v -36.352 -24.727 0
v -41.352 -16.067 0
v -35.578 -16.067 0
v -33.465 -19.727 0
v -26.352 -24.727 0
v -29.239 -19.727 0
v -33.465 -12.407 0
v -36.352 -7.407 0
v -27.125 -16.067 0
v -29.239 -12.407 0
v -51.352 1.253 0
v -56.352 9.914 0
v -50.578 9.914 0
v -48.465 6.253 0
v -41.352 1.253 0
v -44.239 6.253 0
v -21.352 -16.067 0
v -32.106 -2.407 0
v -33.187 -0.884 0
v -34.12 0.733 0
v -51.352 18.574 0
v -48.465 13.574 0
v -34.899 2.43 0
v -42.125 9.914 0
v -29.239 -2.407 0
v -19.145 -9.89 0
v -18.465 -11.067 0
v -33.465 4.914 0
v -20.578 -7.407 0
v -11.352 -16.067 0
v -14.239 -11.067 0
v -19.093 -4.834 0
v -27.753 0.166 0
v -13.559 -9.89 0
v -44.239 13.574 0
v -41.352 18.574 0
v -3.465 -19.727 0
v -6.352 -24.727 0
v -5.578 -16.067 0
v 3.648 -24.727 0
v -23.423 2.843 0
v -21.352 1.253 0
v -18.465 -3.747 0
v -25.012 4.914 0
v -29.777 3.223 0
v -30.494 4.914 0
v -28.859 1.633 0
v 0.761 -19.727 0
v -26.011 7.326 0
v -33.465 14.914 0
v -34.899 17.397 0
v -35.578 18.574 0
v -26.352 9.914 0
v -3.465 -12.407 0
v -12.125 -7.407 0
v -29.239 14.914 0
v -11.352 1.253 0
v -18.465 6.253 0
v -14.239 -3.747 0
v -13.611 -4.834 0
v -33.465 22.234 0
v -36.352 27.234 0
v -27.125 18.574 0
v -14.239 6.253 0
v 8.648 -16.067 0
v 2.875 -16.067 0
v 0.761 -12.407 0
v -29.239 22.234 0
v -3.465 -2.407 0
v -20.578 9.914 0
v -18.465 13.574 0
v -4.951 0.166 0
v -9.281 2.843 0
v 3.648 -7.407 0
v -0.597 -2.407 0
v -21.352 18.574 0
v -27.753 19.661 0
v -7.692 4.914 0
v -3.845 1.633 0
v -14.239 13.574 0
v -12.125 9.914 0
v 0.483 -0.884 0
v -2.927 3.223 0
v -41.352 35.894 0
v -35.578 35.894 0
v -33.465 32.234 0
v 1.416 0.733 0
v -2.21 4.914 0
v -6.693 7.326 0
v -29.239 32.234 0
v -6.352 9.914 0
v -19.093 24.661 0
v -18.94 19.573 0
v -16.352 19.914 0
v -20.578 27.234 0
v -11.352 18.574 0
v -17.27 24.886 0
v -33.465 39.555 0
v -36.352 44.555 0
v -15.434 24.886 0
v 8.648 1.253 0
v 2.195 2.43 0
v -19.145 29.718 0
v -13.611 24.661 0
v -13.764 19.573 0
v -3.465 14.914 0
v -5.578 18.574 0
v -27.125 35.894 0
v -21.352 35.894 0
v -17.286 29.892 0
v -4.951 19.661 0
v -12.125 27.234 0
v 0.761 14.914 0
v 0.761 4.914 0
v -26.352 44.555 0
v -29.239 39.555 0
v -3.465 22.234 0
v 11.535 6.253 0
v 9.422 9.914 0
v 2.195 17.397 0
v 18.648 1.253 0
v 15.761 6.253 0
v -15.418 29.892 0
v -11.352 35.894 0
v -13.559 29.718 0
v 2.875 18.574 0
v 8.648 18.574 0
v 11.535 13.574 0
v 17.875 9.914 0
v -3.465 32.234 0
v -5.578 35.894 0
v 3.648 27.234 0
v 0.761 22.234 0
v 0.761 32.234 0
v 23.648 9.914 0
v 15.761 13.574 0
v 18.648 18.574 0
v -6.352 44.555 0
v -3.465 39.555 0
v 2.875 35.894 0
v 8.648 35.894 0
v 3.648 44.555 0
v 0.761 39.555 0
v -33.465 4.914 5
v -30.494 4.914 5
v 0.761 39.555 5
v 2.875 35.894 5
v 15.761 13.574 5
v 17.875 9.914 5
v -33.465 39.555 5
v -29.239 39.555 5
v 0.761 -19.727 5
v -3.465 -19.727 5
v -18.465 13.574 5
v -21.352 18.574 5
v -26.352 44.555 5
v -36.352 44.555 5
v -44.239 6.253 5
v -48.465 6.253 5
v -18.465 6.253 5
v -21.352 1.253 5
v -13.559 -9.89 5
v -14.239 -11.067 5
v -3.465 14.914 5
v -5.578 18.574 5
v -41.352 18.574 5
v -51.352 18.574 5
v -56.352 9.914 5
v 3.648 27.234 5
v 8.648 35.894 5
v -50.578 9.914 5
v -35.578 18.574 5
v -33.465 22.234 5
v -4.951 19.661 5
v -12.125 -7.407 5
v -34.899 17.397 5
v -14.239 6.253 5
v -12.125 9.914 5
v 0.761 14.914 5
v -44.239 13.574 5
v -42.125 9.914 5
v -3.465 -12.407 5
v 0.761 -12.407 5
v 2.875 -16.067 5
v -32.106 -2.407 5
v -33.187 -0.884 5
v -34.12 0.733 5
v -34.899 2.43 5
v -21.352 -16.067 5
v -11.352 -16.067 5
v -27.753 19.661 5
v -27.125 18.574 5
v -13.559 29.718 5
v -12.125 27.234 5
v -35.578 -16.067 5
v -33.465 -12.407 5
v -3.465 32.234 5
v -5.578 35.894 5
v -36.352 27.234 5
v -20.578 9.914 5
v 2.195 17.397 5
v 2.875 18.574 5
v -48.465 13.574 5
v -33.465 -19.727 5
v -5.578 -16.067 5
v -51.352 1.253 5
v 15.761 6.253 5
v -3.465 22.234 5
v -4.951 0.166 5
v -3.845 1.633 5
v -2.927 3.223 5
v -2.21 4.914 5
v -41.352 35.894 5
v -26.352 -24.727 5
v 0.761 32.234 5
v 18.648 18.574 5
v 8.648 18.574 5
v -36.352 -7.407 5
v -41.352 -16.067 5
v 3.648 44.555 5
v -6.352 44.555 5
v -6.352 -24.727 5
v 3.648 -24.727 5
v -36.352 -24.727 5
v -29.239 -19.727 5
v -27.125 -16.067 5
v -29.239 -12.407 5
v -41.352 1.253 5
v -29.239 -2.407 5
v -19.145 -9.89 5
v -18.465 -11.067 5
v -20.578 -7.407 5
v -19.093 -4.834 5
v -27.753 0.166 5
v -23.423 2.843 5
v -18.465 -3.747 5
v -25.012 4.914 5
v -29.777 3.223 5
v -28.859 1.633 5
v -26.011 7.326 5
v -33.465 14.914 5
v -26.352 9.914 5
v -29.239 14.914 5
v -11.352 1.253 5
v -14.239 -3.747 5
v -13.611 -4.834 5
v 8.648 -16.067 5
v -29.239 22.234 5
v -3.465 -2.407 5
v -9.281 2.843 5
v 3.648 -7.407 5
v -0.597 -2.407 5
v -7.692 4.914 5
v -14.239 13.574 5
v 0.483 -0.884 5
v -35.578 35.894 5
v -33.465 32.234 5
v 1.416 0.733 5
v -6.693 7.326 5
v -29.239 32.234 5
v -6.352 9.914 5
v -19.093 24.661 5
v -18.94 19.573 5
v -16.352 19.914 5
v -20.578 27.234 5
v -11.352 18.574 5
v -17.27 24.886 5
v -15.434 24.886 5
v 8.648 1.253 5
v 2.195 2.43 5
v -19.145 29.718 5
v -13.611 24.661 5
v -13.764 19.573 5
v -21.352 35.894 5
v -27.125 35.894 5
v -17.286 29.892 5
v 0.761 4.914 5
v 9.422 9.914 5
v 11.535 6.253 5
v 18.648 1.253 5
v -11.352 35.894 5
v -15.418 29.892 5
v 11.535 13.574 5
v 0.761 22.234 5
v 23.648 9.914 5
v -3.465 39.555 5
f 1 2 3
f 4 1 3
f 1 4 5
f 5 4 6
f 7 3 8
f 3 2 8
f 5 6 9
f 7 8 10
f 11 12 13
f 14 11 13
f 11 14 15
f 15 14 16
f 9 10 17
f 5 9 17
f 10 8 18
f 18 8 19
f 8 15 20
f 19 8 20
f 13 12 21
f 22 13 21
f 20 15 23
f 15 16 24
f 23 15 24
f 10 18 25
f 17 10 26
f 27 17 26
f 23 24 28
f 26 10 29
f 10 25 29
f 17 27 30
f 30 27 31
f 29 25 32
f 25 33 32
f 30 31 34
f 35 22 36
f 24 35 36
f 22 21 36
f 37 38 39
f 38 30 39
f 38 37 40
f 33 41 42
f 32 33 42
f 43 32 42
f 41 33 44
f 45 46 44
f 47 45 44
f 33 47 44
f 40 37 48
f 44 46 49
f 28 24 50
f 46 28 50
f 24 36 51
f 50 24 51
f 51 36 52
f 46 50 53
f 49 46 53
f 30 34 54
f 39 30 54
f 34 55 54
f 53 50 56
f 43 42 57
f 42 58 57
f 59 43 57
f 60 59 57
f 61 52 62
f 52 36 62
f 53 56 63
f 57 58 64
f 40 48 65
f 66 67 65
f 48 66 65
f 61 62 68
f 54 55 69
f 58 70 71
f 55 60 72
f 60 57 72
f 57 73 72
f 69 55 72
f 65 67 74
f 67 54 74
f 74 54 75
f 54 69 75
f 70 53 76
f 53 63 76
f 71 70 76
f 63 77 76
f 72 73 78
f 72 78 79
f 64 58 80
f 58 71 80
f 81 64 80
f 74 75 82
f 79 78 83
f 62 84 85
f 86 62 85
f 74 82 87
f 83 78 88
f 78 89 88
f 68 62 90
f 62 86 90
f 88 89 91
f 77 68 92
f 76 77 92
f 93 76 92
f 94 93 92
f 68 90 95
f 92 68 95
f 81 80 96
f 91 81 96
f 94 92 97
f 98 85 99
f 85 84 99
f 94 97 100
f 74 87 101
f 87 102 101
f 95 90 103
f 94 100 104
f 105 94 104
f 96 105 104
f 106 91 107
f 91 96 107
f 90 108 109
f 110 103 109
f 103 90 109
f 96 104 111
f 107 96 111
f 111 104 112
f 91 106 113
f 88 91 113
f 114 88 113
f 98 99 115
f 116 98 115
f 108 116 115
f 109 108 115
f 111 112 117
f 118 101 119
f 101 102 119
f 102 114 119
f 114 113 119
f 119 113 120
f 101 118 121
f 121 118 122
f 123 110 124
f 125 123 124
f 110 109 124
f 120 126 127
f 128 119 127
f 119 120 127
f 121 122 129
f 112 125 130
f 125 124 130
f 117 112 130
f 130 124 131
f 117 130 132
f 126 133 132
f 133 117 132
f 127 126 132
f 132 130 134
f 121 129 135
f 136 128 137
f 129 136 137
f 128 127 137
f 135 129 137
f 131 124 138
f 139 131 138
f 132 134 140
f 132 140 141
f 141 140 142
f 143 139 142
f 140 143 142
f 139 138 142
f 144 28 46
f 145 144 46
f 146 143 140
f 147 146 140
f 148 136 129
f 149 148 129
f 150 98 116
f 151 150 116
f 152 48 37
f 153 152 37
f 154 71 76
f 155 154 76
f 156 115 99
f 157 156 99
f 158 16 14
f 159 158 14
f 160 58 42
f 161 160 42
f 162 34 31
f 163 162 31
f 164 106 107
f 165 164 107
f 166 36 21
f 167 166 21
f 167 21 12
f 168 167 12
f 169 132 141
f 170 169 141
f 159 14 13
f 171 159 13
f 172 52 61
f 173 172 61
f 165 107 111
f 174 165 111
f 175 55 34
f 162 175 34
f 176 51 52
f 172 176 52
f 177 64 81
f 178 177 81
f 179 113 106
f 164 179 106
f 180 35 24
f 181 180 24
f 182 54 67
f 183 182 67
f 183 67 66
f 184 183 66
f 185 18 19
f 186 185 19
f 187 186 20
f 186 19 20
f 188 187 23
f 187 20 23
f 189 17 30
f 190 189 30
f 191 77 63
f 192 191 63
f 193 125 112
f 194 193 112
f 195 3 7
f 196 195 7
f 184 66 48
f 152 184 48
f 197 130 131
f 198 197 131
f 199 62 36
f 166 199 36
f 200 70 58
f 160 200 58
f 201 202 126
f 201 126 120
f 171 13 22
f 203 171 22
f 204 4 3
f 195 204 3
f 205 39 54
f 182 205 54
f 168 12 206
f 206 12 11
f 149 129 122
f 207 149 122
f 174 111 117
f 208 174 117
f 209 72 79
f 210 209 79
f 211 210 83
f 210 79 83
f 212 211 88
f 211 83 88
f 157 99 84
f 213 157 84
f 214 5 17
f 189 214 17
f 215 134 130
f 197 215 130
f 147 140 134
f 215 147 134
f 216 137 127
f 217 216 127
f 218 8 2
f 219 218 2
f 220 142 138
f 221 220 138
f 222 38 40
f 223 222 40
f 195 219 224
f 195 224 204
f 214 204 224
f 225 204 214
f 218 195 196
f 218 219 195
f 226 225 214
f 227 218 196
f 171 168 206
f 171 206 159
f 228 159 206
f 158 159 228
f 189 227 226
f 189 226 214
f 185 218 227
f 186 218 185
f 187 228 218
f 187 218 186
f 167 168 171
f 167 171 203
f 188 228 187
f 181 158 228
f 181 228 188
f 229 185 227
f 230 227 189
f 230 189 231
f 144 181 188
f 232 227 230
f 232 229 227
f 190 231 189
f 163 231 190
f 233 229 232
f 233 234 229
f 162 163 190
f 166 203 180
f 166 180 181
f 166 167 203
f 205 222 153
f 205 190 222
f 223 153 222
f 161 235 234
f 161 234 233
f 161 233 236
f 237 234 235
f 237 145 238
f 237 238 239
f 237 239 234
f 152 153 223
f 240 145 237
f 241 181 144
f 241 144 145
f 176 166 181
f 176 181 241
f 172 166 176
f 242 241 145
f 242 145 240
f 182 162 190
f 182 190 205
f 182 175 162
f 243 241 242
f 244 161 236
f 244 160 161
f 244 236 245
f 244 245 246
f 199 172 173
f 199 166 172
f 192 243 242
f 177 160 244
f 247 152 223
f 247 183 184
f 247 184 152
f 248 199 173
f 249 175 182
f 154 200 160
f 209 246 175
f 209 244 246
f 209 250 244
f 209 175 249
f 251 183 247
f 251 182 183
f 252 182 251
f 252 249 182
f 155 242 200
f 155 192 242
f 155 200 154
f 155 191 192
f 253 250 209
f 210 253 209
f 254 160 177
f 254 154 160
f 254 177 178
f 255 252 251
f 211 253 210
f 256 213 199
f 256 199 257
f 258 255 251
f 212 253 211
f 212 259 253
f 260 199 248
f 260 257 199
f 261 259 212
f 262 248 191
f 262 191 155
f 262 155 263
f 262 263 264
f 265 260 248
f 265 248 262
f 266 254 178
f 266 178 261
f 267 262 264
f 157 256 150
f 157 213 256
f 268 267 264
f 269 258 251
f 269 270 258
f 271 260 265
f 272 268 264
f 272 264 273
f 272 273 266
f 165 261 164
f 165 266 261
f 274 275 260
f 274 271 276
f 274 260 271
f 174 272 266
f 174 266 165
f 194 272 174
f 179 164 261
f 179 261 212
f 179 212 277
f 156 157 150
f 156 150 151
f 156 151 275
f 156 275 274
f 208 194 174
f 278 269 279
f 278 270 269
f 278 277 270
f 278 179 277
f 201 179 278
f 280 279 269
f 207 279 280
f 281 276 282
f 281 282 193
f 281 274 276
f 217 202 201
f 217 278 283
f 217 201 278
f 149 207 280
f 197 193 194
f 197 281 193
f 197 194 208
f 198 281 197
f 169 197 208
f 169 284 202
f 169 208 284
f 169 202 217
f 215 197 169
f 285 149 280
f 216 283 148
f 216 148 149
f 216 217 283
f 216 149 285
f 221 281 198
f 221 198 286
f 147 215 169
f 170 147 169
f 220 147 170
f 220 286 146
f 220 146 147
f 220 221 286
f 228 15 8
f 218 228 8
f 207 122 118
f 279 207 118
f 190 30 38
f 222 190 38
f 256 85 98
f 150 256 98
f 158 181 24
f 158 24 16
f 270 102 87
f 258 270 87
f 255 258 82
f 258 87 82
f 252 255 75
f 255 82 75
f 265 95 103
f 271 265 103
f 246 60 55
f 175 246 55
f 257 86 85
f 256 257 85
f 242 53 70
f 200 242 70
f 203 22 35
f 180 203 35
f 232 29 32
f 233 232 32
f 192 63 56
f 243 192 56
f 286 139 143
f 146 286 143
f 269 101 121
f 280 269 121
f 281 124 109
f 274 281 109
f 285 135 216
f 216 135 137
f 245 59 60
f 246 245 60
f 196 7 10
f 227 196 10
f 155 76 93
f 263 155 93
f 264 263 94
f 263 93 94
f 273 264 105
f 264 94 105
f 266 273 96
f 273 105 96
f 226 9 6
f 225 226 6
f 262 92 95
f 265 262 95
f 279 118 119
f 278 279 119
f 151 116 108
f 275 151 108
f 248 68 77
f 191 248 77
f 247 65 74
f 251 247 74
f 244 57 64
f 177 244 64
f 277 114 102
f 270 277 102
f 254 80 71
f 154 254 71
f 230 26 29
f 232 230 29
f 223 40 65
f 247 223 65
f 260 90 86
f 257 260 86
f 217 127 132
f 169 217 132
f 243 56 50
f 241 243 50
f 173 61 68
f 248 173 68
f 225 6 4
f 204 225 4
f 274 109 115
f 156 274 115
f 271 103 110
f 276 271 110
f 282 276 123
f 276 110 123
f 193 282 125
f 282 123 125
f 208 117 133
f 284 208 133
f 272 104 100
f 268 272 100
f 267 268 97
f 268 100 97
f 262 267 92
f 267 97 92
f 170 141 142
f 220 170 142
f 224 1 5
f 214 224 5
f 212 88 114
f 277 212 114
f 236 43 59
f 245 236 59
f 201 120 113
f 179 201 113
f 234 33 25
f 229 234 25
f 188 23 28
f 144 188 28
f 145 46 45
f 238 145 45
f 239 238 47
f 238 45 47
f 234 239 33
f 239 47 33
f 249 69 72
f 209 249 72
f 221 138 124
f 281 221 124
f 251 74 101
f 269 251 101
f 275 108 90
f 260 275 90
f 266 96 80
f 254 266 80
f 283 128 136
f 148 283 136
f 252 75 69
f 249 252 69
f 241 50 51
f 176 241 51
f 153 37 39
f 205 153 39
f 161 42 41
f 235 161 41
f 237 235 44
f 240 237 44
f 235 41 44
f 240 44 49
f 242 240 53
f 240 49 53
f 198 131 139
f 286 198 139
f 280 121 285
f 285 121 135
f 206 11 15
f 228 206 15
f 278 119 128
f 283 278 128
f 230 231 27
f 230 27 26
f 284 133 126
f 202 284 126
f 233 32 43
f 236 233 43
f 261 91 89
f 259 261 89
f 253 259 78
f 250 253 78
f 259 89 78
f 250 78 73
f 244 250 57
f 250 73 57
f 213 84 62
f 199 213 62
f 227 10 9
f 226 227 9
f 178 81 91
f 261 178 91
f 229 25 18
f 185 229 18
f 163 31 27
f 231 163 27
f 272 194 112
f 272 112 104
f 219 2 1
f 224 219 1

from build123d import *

# Parameters (mm, degrees)
F1_DEPTH = 5


with BuildPart() as f1:
    # F0 (on Top) → F1 (new body)
    with BuildSketch(Plane.XY):
        with BuildLine():
            Line((-11.351928, -16.06705), (-6.351928, -7.406796))
            ThreePointArc((-6.351928, -7.406796), (-9.836197, -8.995155), (-13.559318, -9.890362))
            Line((-13.559318, -9.890362), (-14.238679, -11.06705))
            Line((-14.238679, -11.06705), (-18.465176, -11.06705))
            Line((-18.465176, -11.06705), (-19.144538, -9.890362))
            ThreePointArc((-19.144538, -9.890362), (-22.867658, -8.995155), (-26.351928, -7.406796))
            Line((-26.351928, -7.406796), (-21.351928, -16.06705))
            Line((-21.351928, -16.06705), (-11.351928, -16.06705))
        make_face()
        Polygon((-21.351928, 18.573966), (-26.351928, 9.913712), (-20.578425, 9.913712), (-18.465176, 13.573966), align=None)
        with BuildLine():
            Line((-41.351928, 18.573966), (-36.351928, 9.913712))
            ThreePointArc((-36.351928, 9.913712), (-35.985352, 13.725357), (-34.899064, 17.397277))
            Line((-34.899064, 17.397277), (-35.578425, 18.573966))
            Line((-35.578425, 18.573966), (-33.465176, 22.23422))
            Line((-33.465176, 22.23422), (-32.106454, 22.23422))
            ThreePointArc((-32.106454, 22.23422), (-29.469622, 25.010934), (-26.351928, 27.23422))
            Line((-26.351928, 27.23422), (-36.351928, 27.23422))
            Line((-36.351928, 27.23422), (-41.351928, 18.573966))
        make_face()
        Polygon((-36.351928, 27.23422), (-26.351928, 27.23422), (-21.351928, 35.894474), (-26.351928, 44.554728), (-36.351928, 44.554728), (-41.351928, 35.894474), align=None)
        Polygon((-33.465176, 39.554728), (-29.238679, 39.554728), (-27.12543, 35.894474), (-29.238679, 32.23422), (-33.465176, 32.23422), (-35.578425, 35.894474), align=None, mode=Mode.SUBTRACT)
        Polygon((-41.351928, 1.253458), (-36.351928, 9.913712), (-41.351928, 18.573966), (-51.351928, 18.573966), (-56.351928, 9.913712), (-51.351928, 1.253458), align=None)
        Polygon((-50.578425, 9.913712), (-48.465176, 13.573966), (-44.238679, 13.573966), (-42.12543, 9.913712), (-44.238679, 6.253458), (-48.465176, 6.253458), align=None, mode=Mode.SUBTRACT)
        with BuildLine():
            ThreePointArc((-11.351928, 18.573966), (-7.691674, 14.913712), (-6.351928, 9.913712))
            Line((-6.351928, 9.913712), (-1.351928, 9.913712))
            ThreePointArc((-1.351928, 9.913712), (-1.567949, 12.450242), (-2.209792, 14.913712))
            Line((-2.209792, 14.913712), (-3.465176, 14.913712))
            Line((-3.465176, 14.913712), (-5.578425, 18.573966))
            Line((-5.578425, 18.573966), (-4.950733, 19.661161))
            ThreePointArc((-4.950733, 19.661161), (-6.763239, 21.448748), (-8.851928, 22.904093))
            Line((-8.851928, 22.904093), (-11.351928, 18.573966))
        make_face()
        Polygon((-11.351928, 35.894474), (-6.351928, 27.23422), (3.648072, 27.23422), (8.648072, 35.894474), (3.648072, 44.554728), (-6.351928, 44.554728), align=None)
        Polygon((-5.578425, 35.894474), (-3.465176, 39.554728), (0.761321, 39.554728), (2.87457, 35.894474), (0.761321, 32.23422), (-3.465176, 32.23422), align=None, mode=Mode.SUBTRACT)
        Polygon((8.648072, 18.573966), (3.648072, 9.913712), (8.648072, 1.253458), (18.648072, 1.253458), (23.648072, 9.913712), (18.648072, 18.573966), align=None)
        Polygon((15.761321, 13.573966), (17.87457, 9.913712), (15.761321, 6.253458), (11.534824, 6.253458), (9.421575, 9.913712), (11.534824, 13.573966), align=None, mode=Mode.SUBTRACT)
        Polygon((-12.12543, 9.913712), (-6.351928, 9.913712), (-11.351928, 18.573966), (-14.238679, 13.573966), align=None)
        Polygon((3.648072, -7.406796), (-6.351928, -7.406796), (-11.351928, -16.06705), (-6.351928, -24.727304), (3.648072, -24.727304), (8.648072, -16.06705), align=None)
        Polygon((0.761321, -12.406796), (2.874569, -16.06705), (0.761321, -19.727304), (-3.465176, -19.727304), (-5.578425, -16.06705), (-3.465176, -12.406796), align=None, mode=Mode.SUBTRACT)
        with BuildLine():
            Line((-31.351928, 9.913712), (-26.351928, 9.913712))
            ThreePointArc((-26.351928, 9.913712), (-25.012182, 14.913712), (-21.351928, 18.573966))
            Line((-21.351928, 18.573966), (-23.851928, 22.904093))
            ThreePointArc((-23.851928, 22.904093), (-25.940616, 21.448748), (-27.753123, 19.661161))
            Line((-27.753123, 19.661161), (-27.12543, 18.573966))
            Line((-27.12543, 18.573966), (-29.238679, 14.913712))
            Line((-29.238679, 14.913712), (-30.494063, 14.913712))
            ThreePointArc((-30.494063, 14.913712), (-31.135906, 12.450242), (-31.351928, 9.913712))
        make_face()
        Polygon((-21.351928, -16.06705), (-26.351928, -7.406796), (-36.351928, -7.406796), (-41.351928, -16.06705), (-36.351928, -24.727304), (-26.351928, -24.727304), align=None)
        Polygon((-33.465176, -19.727304), (-35.578425, -16.06705), (-33.465176, -12.406796), (-29.238679, -12.406796), (-27.12543, -16.06705), (-29.238679, -19.727304), align=None, mode=Mode.SUBTRACT)
        with BuildLine():
            Line((-36.351928, -7.406796), (-26.351928, -7.406796))
            ThreePointArc((-26.351928, -7.406796), (-29.469622, -5.18351), (-32.106454, -2.406796))
            Line((-32.106454, -2.406796), (-33.465176, -2.406796))
            Line((-33.465176, -2.406796), (-35.578425, 1.253458))
            Line((-35.578425, 1.253458), (-34.899064, 2.430146))
            ThreePointArc((-34.899064, 2.430146), (-35.985352, 6.102066), (-36.351928, 9.913712))
            Line((-36.351928, 9.913712), (-41.351928, 1.253458))
            Line((-41.351928, 1.253458), (-36.351928, -7.406796))
        make_face()
        with BuildLine():
            ThreePointArc((2.195208, 17.397277), (3.281497, 13.725357), (3.648072, 9.913712))
            Line((3.648072, 9.913712), (8.648072, 18.573966))
            Line((8.648072, 18.573966), (3.648072, 27.23422))
            Line((3.648072, 27.23422), (-6.351928, 27.23422))
            ThreePointArc((-6.351928, 27.23422), (-3.234234, 25.010934), (-0.597402, 22.23422))
            Line((-0.597402, 22.23422), (0.761321, 22.23422))
            Line((0.761321, 22.23422), (2.87457, 18.573966))
            Line((2.87457, 18.573966), (2.195208, 17.397277))
        make_face()
        with BuildLine():
            ThreePointArc((-13.559318, 29.717785), (-9.836197, 28.822579), (-6.351928, 27.23422))
            Line((-6.351928, 27.23422), (-11.351928, 35.894474))
            Line((-11.351928, 35.894474), (-21.351928, 35.894474))
            Line((-21.351928, 35.894474), (-26.351928, 27.23422))
            ThreePointArc((-26.351928, 27.23422), (-22.867658, 28.822579), (-19.144538, 29.717785))
            Line((-19.144538, 29.717785), (-18.465176, 30.894474))
            Line((-18.465176, 30.894474), (-14.238679, 30.894474))
            Line((-14.238679, 30.894474), (-13.559318, 29.717785))
        make_face()
        with BuildLine():
            ThreePointArc((-0.597402, -2.406796), (-3.234234, -5.18351), (-6.351928, -7.406796))
            Line((-6.351928, -7.406796), (3.648072, -7.406796))
            Line((3.648072, -7.406796), (8.648072, 1.253458))
            Line((8.648072, 1.253458), (3.648072, 9.913712))
            ThreePointArc((3.648072, 9.913712), (3.281497, 6.102066), (2.195208, 2.430146))
            Line((2.195208, 2.430146), (2.87457, 1.253458))
            Line((2.87457, 1.253458), (0.761321, -2.406796))
            Line((0.761321, -2.406796), (-0.597402, -2.406796))
        make_face()
        with BuildLine():
            Line((-26.351928, 27.23422), (-23.851928, 22.904093))
            ThreePointArc((-23.851928, 22.904093), (-21.547218, 23.985278), (-19.092869, 24.661161))
            Line((-19.092869, 24.661161), (-20.578425, 27.23422))
            Line((-20.578425, 27.23422), (-19.144538, 29.717785))
            ThreePointArc((-19.144538, 29.717785), (-22.867658, 28.822579), (-26.351928, 27.23422))
        make_face()
        with BuildLine():
            ThreePointArc((-30.494063, 4.913712), (-31.135906, 7.377182), (-31.351928, 9.913712))
            Line((-31.351928, 9.913712), (-36.351928, 9.913712))
            ThreePointArc((-36.351928, 9.913712), (-35.985352, 6.102066), (-34.899064, 2.430146))
            Line((-34.899064, 2.430146), (-33.465176, 4.913712))
            Line((-33.465176, 4.913712), (-30.494063, 4.913712))
        make_face()
        with BuildLine():
            ThreePointArc((-6.351928, 9.913712), (-7.691674, 4.913712), (-11.351928, 1.253458))
            Line((-11.351928, 1.253458), (-8.851928, -3.076669))
            ThreePointArc((-8.851928, -3.076669), (-6.763239, -1.621324), (-4.950733, 0.166263))
            Line((-4.950733, 0.166263), (-5.578425, 1.253458))
            Line((-5.578425, 1.253458), (-3.465176, 4.913712))
            Line((-3.465176, 4.913712), (-2.209792, 4.913712))
            ThreePointArc((-2.209792, 4.913712), (-1.567949, 7.377182), (-1.351928, 9.913712))
            Line((-1.351928, 9.913712), (-6.351928, 9.913712))
        make_face()
        with BuildLine():
            Line((-36.351928, 9.913712), (-31.351928, 9.913712))
            ThreePointArc((-31.351928, 9.913712), (-31.135906, 12.450242), (-30.494063, 14.913712))
            Line((-30.494063, 14.913712), (-33.465176, 14.913712))
            Line((-33.465176, 14.913712), (-34.899064, 17.397277))
            ThreePointArc((-34.899064, 17.397277), (-35.985352, 13.725357), (-36.351928, 9.913712))
        make_face()
        with BuildLine():
            Line((-8.851928, -3.076669), (-11.351928, 1.253458))
            ThreePointArc((-11.351928, 1.253458), (-16.351928, -0.086288), (-21.351928, 1.253458))
            Line((-21.351928, 1.253458), (-23.851928, -3.076669))
            ThreePointArc((-23.851928, -3.076669), (-21.547218, -4.157854), (-19.092869, -4.833737))
            Line((-19.092869, -4.833737), (-18.465176, -3.746542))
            Line((-18.465176, -3.746542), (-14.238679, -3.746542))
            Line((-14.238679, -3.746542), (-13.610987, -4.833737))
            ThreePointArc((-13.610987, -4.833737), (-11.156638, -4.157854), (-8.851928, -3.076669))
        make_face()
        with BuildLine():
            ThreePointArc((-13.610987, 24.661161), (-11.156638, 23.985278), (-8.851928, 22.904093))
            Line((-8.851928, 22.904093), (-6.351928, 27.23422))
            ThreePointArc((-6.351928, 27.23422), (-9.836197, 28.822579), (-13.559318, 29.717785))
            Line((-13.559318, 29.717785), (-12.12543, 27.23422))
            Line((-12.12543, 27.23422), (-13.610987, 24.661161))
        make_face()
        with BuildLine():
            Line((-23.851928, -3.076669), (-21.351928, 1.253458))
            ThreePointArc((-21.351928, 1.253458), (-25.012182, 4.913712), (-26.351928, 9.913712))
            Line((-26.351928, 9.913712), (-31.351928, 9.913712))
            ThreePointArc((-31.351928, 9.913712), (-31.135906, 7.377182), (-30.494063, 4.913712))
            Line((-30.494063, 4.913712), (-29.238679, 4.913712))
            Line((-29.238679, 4.913712), (-27.12543, 1.253458))
            Line((-27.12543, 1.253458), (-27.753123, 0.166263))
            ThreePointArc((-27.753123, 0.166263), (-25.940616, -1.621324), (-23.851928, -3.076669))
        make_face()
        with BuildLine():
            ThreePointArc((-21.351928, 18.573966), (-16.351928, 19.913712), (-11.351928, 18.573966))
            Line((-11.351928, 18.573966), (-8.851928, 22.904093))
            ThreePointArc((-8.851928, 22.904093), (-11.156638, 23.985278), (-13.610987, 24.661161))
            Line((-13.610987, 24.661161), (-14.238679, 23.573966))
            Line((-14.238679, 23.573966), (-18.465176, 23.573966))
            Line((-18.465176, 23.573966), (-19.092869, 24.661161))
            ThreePointArc((-19.092869, 24.661161), (-21.547218, 23.985278), (-23.851928, 22.904093))
            Line((-23.851928, 22.904093), (-21.351928, 18.573966))
        make_face()
        with BuildLine():
            Line((3.648072, 9.913712), (-1.351928, 9.913712))
            ThreePointArc((-1.351928, 9.913712), (-1.567949, 7.377182), (-2.209792, 4.913712))
            Line((-2.209792, 4.913712), (0.761321, 4.913712))
            Line((0.761321, 4.913712), (2.195208, 2.430146))
            ThreePointArc((2.195208, 2.430146), (3.281497, 6.102066), (3.648072, 9.913712))
        make_face()
        with BuildLine():
            ThreePointArc((-19.092869, -4.833737), (-21.547218, -4.157854), (-23.851928, -3.076669))
            Line((-23.851928, -3.076669), (-26.351928, -7.406796))
            ThreePointArc((-26.351928, -7.406796), (-22.867658, -8.995155), (-19.144538, -9.890362))
            Line((-19.144538, -9.890362), (-20.578425, -7.406796))
            Line((-20.578425, -7.406796), (-19.092869, -4.833737))
        make_face()
        with BuildLine():
            Line((-6.351928, -7.406796), (-8.851928, -3.076669))
            ThreePointArc((-8.851928, -3.076669), (-11.156638, -4.157854), (-13.610987, -4.833737))
            Line((-13.610987, -4.833737), (-12.12543, -7.406796))
            Line((-12.12543, -7.406796), (-13.559318, -9.890362))
            ThreePointArc((-13.559318, -9.890362), (-9.836197, -8.995155), (-6.351928, -7.406796))
        make_face()
        with BuildLine():
            ThreePointArc((-2.209792, 14.913712), (-1.567949, 12.450242), (-1.351928, 9.913712))
            Line((-1.351928, 9.913712), (3.648072, 9.913712))
            ThreePointArc((3.648072, 9.913712), (3.281497, 13.725357), (2.195208, 17.397277))
            Line((2.195208, 17.397277), (0.761321, 14.913712))
            Line((0.761321, 14.913712), (-2.209792, 14.913712))
        make_face()
        with BuildLine():
            Line((-26.351928, -7.406796), (-23.851928, -3.076669))
            ThreePointArc((-23.851928, -3.076669), (-25.940616, -1.621324), (-27.753123, 0.166263))
            Line((-27.753123, 0.166263), (-29.238679, -2.406796))
            Line((-29.238679, -2.406796), (-32.106454, -2.406796))
            ThreePointArc((-32.106454, -2.406796), (-29.469622, -5.18351), (-26.351928, -7.406796))
        make_face()
        with BuildLine():
            Line((-6.351928, 27.23422), (-8.851928, 22.904093))
            ThreePointArc((-8.851928, 22.904093), (-6.763239, 21.448748), (-4.950733, 19.661161))
            Line((-4.950733, 19.661161), (-3.465176, 22.23422))
            Line((-3.465176, 22.23422), (-0.597402, 22.23422))
            ThreePointArc((-0.597402, 22.23422), (-3.234234, 25.010934), (-6.351928, 27.23422))
        make_face()
        with BuildLine():
            ThreePointArc((-27.753123, 19.661161), (-25.940616, 21.448748), (-23.851928, 22.904093))
            Line((-23.851928, 22.904093), (-26.351928, 27.23422))
            ThreePointArc((-26.351928, 27.23422), (-29.469622, 25.010934), (-32.106454, 22.23422))
            Line((-32.106454, 22.23422), (-29.238679, 22.23422))
            Line((-29.238679, 22.23422), (-27.753123, 19.661161))
        make_face()
        Polygon((-21.351928, 1.253458), (-11.351928, 1.253458), (-14.238679, 6.253458), (-18.465176, 6.253458), align=None)
        with BuildLine():
            ThreePointArc((-4.950733, 0.166263), (-6.763239, -1.621324), (-8.851928, -3.076669))
            Line((-8.851928, -3.076669), (-6.351928, -7.406796))
            ThreePointArc((-6.351928, -7.406796), (-3.234234, -5.18351), (-0.597402, -2.406796))
            Line((-0.597402, -2.406796), (-3.465176, -2.406796))
            Line((-3.465176, -2.406796), (-4.950733, 0.166263))
        make_face()
        Polygon((-16.351928, 9.913712), (-12.12543, 9.913712), (-14.238679, 13.573966), align=None)
        Polygon((-18.465176, 13.573966), (-16.351928, 9.913712), (-14.238679, 13.573966), align=None)
        Polygon((-20.578425, 9.913712), (-16.351928, 9.913712), (-18.465176, 13.573966), align=None)
        Polygon((-16.351928, 9.913712), (-14.238679, 6.253458), (-12.12543, 9.913712), align=None)
        Polygon((-20.578425, 9.913712), (-18.465176, 6.253458), (-16.351928, 9.913712), align=None)
        Polygon((-18.465176, 6.253458), (-14.238679, 6.253458), (-16.351928, 9.913712), align=None)
        with BuildLine():
            ThreePointArc((-21.351928, 18.573966), (-25.012182, 14.913712), (-26.351928, 9.913712))
            Line((-26.351928, 9.913712), (-21.351928, 18.573966))
        make_face()
        with BuildLine():
            ThreePointArc((-21.351928, 1.253458), (-16.351928, -0.086288), (-11.351928, 1.253458))
            Line((-11.351928, 1.253458), (-21.351928, 1.253458))
        make_face()
        with BuildLine():
            Line((-11.351928, 18.573966), (-6.351928, 9.913712))
            ThreePointArc((-6.351928, 9.913712), (-7.691674, 14.913712), (-11.351928, 18.573966))
        make_face()
        with BuildLine():
            Line((-5.578425, 1.253458), (-4.950733, 0.166263))
            ThreePointArc((-4.950733, 0.166263), (-3.361547, 2.413712), (-2.209792, 4.913712))
            Line((-2.209792, 4.913712), (-3.465176, 4.913712))
            Line((-3.465176, 4.913712), (-5.578425, 1.253458))
        make_face()
        with BuildLine():
            ThreePointArc((2.195208, 2.430146), (0.96858, -0.086288), (-0.597402, -2.406796))
            Line((-0.597402, -2.406796), (0.761321, -2.406796))
            Line((0.761321, -2.406796), (2.87457, 1.253458))
            Line((2.87457, 1.253458), (2.195208, 2.430146))
        make_face()
        with BuildLine():
            ThreePointArc((-19.144538, 29.717785), (-16.351928, 29.913712), (-13.559318, 29.717785))
            Line((-13.559318, 29.717785), (-14.238679, 30.894474))
            Line((-14.238679, 30.894474), (-18.465176, 30.894474))
            Line((-18.465176, 30.894474), (-19.144538, 29.717785))
        make_face()
        with BuildLine():
            Line((-14.238679, 23.573966), (-13.610987, 24.661161))
            ThreePointArc((-13.610987, 24.661161), (-16.351928, 24.913712), (-19.092869, 24.661161))
            Line((-19.092869, 24.661161), (-18.465176, 23.573966))
            Line((-18.465176, 23.573966), (-14.238679, 23.573966))
        make_face()
        with BuildLine():
            Line((-33.465176, -2.406796), (-32.106454, -2.406796))
            ThreePointArc((-32.106454, -2.406796), (-33.672436, -0.086288), (-34.899064, 2.430146))
            Line((-34.899064, 2.430146), (-35.578425, 1.253458))
            Line((-35.578425, 1.253458), (-33.465176, -2.406796))
        make_face()
        with BuildLine():
            ThreePointArc((-30.494063, 4.913712), (-29.342309, 2.413712), (-27.753123, 0.166263))
            Line((-27.753123, 0.166263), (-27.12543, 1.253458))
            Line((-27.12543, 1.253458), (-29.238679, 4.913712))
            Line((-29.238679, 4.913712), (-30.494063, 4.913712))
        make_face()
    extrude(amount=F1_DEPTH)


solid = f1.part
